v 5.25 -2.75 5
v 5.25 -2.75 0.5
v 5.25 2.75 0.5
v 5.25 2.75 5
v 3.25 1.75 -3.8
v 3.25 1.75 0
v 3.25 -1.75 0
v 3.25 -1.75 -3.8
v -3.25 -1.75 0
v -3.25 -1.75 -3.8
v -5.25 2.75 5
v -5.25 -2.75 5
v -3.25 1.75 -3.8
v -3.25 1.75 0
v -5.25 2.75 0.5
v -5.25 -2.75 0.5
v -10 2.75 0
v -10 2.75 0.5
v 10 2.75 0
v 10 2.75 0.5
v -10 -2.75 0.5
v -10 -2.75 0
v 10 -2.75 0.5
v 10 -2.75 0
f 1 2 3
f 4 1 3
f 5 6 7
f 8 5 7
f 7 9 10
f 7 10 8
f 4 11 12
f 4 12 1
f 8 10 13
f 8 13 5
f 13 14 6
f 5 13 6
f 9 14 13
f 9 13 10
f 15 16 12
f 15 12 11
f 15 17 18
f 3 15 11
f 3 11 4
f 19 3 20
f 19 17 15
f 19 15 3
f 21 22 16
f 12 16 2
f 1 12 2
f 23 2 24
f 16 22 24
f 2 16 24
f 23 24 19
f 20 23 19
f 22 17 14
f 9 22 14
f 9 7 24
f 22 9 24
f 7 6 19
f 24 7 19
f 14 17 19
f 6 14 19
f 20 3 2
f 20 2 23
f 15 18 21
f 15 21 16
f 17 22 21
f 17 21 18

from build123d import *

# Parameters (mm, degrees)
F0_W     = 20
F0_H     = 5.5
F1_DEPTH = 0.5
F2_W     = 10.5
F2_H     = 5.5
F3_DEPTH = 4.5
F4_W     = 6.5
F4_H     = 3.5
F5_DEPTH = 3.8


with BuildPart() as f1:
    # F0 (on Top) → F1 (new body)
    with BuildSketch(Plane.XY):
        Rectangle(F0_W, F0_H)
    extrude(amount=F1_DEPTH)

    # F2 (on face) → F3 (join)
    with BuildSketch(Plane.XY.offset(0.5)):
        Rectangle(F2_W, F2_H)
    extrude(amount=F3_DEPTH)

    # F4 (on face) → F5 (join)
    with BuildSketch(Plane(origin=(0, 0, 0), x_dir=(1, 0, 0), z_dir=(0, 0, -1))):
        Rectangle(F4_W, F4_H)
    extrude(amount=F5_DEPTH)


solid = f1.part
